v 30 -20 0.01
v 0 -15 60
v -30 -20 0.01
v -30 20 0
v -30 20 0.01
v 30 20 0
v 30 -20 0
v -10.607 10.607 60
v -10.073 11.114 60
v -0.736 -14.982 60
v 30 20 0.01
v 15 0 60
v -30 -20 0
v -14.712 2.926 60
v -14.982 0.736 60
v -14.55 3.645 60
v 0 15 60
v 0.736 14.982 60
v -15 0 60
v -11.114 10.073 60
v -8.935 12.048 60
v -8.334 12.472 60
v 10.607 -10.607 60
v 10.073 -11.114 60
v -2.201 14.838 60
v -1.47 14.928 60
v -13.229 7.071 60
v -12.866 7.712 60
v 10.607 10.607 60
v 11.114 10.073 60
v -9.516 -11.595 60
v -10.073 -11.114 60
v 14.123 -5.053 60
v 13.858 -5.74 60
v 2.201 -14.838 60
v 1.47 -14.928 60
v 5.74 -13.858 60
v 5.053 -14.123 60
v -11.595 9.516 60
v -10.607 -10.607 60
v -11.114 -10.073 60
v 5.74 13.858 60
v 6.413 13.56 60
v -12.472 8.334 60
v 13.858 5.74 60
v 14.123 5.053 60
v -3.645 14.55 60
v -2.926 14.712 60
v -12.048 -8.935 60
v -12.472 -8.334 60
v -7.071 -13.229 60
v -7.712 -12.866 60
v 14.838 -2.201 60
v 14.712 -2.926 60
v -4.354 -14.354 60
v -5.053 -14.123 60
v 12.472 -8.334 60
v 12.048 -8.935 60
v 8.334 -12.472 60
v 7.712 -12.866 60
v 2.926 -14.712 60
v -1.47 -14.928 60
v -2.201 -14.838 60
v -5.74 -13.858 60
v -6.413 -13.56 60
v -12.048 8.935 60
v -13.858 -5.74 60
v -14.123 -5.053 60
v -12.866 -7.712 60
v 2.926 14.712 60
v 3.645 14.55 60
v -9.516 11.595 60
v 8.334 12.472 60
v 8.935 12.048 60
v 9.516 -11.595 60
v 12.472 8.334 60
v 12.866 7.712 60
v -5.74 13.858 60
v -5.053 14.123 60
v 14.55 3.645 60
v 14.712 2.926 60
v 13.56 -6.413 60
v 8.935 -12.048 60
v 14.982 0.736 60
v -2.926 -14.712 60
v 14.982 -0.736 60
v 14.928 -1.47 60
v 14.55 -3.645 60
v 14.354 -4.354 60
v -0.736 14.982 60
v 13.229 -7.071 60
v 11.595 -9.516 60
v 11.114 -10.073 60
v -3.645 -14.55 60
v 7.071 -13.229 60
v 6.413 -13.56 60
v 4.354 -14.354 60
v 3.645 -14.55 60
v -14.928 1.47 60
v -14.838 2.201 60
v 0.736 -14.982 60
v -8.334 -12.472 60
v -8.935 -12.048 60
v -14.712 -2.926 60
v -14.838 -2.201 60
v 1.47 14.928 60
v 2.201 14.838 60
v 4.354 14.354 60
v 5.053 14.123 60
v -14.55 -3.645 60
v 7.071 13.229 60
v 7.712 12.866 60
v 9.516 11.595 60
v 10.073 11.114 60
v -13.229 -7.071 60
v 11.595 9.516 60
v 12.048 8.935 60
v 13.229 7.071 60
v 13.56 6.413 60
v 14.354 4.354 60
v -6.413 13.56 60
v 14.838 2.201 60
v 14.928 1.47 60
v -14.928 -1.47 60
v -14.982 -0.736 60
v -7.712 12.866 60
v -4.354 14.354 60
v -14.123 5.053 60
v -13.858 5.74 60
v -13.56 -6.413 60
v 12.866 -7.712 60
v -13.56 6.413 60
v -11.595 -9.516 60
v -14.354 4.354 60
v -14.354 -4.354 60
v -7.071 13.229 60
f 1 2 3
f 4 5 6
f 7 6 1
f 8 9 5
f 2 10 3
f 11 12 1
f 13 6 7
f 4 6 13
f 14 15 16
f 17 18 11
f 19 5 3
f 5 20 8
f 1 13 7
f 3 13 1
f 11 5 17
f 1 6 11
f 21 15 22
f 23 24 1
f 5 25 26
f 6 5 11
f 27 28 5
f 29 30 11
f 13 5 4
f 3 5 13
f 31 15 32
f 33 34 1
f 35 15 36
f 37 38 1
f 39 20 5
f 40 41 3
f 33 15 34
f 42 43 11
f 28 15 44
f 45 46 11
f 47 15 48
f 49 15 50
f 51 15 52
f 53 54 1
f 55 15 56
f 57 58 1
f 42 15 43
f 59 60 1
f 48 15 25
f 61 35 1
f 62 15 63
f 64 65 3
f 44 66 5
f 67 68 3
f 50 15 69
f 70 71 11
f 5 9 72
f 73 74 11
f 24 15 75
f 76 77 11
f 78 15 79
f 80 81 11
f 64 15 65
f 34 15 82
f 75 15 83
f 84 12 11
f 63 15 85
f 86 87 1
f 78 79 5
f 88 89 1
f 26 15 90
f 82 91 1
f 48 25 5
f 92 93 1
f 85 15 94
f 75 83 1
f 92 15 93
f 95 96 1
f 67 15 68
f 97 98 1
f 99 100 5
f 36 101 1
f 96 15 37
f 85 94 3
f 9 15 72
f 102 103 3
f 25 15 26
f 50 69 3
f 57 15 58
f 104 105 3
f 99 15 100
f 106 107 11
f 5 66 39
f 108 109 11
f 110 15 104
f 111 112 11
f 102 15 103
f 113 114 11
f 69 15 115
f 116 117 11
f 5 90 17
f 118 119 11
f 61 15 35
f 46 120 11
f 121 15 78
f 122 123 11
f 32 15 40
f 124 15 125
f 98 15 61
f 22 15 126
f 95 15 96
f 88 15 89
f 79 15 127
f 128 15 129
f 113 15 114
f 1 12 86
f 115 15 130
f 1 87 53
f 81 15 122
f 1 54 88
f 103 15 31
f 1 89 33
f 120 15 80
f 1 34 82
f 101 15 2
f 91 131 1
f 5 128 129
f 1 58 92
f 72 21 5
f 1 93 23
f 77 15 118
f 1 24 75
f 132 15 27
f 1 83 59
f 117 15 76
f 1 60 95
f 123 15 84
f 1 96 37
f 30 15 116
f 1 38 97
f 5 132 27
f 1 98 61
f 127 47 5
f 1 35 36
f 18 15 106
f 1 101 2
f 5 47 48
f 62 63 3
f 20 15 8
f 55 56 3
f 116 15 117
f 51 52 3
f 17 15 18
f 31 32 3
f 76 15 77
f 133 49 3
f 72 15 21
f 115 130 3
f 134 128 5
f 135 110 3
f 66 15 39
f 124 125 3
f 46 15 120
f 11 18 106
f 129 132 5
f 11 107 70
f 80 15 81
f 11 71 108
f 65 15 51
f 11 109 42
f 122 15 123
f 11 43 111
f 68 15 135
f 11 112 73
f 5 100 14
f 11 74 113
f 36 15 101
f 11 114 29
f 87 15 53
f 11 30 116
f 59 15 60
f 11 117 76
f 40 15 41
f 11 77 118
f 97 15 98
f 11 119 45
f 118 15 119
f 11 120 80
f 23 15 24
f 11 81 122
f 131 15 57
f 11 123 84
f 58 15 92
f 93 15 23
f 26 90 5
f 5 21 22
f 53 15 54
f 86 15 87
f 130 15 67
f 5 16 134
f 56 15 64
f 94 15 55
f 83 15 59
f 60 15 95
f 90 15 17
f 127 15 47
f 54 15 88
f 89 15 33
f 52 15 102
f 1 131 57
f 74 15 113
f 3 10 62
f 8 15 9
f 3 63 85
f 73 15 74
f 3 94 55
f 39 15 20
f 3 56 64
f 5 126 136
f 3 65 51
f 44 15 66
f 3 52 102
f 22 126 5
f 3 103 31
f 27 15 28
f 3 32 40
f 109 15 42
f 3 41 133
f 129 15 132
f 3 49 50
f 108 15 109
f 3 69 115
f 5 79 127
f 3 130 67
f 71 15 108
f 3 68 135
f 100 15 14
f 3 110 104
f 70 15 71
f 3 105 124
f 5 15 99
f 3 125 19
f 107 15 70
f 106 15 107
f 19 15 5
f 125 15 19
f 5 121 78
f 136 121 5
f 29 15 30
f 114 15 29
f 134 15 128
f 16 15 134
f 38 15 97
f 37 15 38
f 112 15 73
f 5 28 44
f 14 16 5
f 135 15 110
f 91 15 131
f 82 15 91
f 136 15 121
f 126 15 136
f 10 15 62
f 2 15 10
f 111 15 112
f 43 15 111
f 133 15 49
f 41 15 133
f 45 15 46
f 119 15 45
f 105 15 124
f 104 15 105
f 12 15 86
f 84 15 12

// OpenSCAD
$fn=128;
// A convex-hull reference; this does not specify a unique loft surface.
hull(){translate([-30,-20,0])cube([60,40,0.01]);translate([0,0,59.99])cylinder(d=30,h=0.01);}
